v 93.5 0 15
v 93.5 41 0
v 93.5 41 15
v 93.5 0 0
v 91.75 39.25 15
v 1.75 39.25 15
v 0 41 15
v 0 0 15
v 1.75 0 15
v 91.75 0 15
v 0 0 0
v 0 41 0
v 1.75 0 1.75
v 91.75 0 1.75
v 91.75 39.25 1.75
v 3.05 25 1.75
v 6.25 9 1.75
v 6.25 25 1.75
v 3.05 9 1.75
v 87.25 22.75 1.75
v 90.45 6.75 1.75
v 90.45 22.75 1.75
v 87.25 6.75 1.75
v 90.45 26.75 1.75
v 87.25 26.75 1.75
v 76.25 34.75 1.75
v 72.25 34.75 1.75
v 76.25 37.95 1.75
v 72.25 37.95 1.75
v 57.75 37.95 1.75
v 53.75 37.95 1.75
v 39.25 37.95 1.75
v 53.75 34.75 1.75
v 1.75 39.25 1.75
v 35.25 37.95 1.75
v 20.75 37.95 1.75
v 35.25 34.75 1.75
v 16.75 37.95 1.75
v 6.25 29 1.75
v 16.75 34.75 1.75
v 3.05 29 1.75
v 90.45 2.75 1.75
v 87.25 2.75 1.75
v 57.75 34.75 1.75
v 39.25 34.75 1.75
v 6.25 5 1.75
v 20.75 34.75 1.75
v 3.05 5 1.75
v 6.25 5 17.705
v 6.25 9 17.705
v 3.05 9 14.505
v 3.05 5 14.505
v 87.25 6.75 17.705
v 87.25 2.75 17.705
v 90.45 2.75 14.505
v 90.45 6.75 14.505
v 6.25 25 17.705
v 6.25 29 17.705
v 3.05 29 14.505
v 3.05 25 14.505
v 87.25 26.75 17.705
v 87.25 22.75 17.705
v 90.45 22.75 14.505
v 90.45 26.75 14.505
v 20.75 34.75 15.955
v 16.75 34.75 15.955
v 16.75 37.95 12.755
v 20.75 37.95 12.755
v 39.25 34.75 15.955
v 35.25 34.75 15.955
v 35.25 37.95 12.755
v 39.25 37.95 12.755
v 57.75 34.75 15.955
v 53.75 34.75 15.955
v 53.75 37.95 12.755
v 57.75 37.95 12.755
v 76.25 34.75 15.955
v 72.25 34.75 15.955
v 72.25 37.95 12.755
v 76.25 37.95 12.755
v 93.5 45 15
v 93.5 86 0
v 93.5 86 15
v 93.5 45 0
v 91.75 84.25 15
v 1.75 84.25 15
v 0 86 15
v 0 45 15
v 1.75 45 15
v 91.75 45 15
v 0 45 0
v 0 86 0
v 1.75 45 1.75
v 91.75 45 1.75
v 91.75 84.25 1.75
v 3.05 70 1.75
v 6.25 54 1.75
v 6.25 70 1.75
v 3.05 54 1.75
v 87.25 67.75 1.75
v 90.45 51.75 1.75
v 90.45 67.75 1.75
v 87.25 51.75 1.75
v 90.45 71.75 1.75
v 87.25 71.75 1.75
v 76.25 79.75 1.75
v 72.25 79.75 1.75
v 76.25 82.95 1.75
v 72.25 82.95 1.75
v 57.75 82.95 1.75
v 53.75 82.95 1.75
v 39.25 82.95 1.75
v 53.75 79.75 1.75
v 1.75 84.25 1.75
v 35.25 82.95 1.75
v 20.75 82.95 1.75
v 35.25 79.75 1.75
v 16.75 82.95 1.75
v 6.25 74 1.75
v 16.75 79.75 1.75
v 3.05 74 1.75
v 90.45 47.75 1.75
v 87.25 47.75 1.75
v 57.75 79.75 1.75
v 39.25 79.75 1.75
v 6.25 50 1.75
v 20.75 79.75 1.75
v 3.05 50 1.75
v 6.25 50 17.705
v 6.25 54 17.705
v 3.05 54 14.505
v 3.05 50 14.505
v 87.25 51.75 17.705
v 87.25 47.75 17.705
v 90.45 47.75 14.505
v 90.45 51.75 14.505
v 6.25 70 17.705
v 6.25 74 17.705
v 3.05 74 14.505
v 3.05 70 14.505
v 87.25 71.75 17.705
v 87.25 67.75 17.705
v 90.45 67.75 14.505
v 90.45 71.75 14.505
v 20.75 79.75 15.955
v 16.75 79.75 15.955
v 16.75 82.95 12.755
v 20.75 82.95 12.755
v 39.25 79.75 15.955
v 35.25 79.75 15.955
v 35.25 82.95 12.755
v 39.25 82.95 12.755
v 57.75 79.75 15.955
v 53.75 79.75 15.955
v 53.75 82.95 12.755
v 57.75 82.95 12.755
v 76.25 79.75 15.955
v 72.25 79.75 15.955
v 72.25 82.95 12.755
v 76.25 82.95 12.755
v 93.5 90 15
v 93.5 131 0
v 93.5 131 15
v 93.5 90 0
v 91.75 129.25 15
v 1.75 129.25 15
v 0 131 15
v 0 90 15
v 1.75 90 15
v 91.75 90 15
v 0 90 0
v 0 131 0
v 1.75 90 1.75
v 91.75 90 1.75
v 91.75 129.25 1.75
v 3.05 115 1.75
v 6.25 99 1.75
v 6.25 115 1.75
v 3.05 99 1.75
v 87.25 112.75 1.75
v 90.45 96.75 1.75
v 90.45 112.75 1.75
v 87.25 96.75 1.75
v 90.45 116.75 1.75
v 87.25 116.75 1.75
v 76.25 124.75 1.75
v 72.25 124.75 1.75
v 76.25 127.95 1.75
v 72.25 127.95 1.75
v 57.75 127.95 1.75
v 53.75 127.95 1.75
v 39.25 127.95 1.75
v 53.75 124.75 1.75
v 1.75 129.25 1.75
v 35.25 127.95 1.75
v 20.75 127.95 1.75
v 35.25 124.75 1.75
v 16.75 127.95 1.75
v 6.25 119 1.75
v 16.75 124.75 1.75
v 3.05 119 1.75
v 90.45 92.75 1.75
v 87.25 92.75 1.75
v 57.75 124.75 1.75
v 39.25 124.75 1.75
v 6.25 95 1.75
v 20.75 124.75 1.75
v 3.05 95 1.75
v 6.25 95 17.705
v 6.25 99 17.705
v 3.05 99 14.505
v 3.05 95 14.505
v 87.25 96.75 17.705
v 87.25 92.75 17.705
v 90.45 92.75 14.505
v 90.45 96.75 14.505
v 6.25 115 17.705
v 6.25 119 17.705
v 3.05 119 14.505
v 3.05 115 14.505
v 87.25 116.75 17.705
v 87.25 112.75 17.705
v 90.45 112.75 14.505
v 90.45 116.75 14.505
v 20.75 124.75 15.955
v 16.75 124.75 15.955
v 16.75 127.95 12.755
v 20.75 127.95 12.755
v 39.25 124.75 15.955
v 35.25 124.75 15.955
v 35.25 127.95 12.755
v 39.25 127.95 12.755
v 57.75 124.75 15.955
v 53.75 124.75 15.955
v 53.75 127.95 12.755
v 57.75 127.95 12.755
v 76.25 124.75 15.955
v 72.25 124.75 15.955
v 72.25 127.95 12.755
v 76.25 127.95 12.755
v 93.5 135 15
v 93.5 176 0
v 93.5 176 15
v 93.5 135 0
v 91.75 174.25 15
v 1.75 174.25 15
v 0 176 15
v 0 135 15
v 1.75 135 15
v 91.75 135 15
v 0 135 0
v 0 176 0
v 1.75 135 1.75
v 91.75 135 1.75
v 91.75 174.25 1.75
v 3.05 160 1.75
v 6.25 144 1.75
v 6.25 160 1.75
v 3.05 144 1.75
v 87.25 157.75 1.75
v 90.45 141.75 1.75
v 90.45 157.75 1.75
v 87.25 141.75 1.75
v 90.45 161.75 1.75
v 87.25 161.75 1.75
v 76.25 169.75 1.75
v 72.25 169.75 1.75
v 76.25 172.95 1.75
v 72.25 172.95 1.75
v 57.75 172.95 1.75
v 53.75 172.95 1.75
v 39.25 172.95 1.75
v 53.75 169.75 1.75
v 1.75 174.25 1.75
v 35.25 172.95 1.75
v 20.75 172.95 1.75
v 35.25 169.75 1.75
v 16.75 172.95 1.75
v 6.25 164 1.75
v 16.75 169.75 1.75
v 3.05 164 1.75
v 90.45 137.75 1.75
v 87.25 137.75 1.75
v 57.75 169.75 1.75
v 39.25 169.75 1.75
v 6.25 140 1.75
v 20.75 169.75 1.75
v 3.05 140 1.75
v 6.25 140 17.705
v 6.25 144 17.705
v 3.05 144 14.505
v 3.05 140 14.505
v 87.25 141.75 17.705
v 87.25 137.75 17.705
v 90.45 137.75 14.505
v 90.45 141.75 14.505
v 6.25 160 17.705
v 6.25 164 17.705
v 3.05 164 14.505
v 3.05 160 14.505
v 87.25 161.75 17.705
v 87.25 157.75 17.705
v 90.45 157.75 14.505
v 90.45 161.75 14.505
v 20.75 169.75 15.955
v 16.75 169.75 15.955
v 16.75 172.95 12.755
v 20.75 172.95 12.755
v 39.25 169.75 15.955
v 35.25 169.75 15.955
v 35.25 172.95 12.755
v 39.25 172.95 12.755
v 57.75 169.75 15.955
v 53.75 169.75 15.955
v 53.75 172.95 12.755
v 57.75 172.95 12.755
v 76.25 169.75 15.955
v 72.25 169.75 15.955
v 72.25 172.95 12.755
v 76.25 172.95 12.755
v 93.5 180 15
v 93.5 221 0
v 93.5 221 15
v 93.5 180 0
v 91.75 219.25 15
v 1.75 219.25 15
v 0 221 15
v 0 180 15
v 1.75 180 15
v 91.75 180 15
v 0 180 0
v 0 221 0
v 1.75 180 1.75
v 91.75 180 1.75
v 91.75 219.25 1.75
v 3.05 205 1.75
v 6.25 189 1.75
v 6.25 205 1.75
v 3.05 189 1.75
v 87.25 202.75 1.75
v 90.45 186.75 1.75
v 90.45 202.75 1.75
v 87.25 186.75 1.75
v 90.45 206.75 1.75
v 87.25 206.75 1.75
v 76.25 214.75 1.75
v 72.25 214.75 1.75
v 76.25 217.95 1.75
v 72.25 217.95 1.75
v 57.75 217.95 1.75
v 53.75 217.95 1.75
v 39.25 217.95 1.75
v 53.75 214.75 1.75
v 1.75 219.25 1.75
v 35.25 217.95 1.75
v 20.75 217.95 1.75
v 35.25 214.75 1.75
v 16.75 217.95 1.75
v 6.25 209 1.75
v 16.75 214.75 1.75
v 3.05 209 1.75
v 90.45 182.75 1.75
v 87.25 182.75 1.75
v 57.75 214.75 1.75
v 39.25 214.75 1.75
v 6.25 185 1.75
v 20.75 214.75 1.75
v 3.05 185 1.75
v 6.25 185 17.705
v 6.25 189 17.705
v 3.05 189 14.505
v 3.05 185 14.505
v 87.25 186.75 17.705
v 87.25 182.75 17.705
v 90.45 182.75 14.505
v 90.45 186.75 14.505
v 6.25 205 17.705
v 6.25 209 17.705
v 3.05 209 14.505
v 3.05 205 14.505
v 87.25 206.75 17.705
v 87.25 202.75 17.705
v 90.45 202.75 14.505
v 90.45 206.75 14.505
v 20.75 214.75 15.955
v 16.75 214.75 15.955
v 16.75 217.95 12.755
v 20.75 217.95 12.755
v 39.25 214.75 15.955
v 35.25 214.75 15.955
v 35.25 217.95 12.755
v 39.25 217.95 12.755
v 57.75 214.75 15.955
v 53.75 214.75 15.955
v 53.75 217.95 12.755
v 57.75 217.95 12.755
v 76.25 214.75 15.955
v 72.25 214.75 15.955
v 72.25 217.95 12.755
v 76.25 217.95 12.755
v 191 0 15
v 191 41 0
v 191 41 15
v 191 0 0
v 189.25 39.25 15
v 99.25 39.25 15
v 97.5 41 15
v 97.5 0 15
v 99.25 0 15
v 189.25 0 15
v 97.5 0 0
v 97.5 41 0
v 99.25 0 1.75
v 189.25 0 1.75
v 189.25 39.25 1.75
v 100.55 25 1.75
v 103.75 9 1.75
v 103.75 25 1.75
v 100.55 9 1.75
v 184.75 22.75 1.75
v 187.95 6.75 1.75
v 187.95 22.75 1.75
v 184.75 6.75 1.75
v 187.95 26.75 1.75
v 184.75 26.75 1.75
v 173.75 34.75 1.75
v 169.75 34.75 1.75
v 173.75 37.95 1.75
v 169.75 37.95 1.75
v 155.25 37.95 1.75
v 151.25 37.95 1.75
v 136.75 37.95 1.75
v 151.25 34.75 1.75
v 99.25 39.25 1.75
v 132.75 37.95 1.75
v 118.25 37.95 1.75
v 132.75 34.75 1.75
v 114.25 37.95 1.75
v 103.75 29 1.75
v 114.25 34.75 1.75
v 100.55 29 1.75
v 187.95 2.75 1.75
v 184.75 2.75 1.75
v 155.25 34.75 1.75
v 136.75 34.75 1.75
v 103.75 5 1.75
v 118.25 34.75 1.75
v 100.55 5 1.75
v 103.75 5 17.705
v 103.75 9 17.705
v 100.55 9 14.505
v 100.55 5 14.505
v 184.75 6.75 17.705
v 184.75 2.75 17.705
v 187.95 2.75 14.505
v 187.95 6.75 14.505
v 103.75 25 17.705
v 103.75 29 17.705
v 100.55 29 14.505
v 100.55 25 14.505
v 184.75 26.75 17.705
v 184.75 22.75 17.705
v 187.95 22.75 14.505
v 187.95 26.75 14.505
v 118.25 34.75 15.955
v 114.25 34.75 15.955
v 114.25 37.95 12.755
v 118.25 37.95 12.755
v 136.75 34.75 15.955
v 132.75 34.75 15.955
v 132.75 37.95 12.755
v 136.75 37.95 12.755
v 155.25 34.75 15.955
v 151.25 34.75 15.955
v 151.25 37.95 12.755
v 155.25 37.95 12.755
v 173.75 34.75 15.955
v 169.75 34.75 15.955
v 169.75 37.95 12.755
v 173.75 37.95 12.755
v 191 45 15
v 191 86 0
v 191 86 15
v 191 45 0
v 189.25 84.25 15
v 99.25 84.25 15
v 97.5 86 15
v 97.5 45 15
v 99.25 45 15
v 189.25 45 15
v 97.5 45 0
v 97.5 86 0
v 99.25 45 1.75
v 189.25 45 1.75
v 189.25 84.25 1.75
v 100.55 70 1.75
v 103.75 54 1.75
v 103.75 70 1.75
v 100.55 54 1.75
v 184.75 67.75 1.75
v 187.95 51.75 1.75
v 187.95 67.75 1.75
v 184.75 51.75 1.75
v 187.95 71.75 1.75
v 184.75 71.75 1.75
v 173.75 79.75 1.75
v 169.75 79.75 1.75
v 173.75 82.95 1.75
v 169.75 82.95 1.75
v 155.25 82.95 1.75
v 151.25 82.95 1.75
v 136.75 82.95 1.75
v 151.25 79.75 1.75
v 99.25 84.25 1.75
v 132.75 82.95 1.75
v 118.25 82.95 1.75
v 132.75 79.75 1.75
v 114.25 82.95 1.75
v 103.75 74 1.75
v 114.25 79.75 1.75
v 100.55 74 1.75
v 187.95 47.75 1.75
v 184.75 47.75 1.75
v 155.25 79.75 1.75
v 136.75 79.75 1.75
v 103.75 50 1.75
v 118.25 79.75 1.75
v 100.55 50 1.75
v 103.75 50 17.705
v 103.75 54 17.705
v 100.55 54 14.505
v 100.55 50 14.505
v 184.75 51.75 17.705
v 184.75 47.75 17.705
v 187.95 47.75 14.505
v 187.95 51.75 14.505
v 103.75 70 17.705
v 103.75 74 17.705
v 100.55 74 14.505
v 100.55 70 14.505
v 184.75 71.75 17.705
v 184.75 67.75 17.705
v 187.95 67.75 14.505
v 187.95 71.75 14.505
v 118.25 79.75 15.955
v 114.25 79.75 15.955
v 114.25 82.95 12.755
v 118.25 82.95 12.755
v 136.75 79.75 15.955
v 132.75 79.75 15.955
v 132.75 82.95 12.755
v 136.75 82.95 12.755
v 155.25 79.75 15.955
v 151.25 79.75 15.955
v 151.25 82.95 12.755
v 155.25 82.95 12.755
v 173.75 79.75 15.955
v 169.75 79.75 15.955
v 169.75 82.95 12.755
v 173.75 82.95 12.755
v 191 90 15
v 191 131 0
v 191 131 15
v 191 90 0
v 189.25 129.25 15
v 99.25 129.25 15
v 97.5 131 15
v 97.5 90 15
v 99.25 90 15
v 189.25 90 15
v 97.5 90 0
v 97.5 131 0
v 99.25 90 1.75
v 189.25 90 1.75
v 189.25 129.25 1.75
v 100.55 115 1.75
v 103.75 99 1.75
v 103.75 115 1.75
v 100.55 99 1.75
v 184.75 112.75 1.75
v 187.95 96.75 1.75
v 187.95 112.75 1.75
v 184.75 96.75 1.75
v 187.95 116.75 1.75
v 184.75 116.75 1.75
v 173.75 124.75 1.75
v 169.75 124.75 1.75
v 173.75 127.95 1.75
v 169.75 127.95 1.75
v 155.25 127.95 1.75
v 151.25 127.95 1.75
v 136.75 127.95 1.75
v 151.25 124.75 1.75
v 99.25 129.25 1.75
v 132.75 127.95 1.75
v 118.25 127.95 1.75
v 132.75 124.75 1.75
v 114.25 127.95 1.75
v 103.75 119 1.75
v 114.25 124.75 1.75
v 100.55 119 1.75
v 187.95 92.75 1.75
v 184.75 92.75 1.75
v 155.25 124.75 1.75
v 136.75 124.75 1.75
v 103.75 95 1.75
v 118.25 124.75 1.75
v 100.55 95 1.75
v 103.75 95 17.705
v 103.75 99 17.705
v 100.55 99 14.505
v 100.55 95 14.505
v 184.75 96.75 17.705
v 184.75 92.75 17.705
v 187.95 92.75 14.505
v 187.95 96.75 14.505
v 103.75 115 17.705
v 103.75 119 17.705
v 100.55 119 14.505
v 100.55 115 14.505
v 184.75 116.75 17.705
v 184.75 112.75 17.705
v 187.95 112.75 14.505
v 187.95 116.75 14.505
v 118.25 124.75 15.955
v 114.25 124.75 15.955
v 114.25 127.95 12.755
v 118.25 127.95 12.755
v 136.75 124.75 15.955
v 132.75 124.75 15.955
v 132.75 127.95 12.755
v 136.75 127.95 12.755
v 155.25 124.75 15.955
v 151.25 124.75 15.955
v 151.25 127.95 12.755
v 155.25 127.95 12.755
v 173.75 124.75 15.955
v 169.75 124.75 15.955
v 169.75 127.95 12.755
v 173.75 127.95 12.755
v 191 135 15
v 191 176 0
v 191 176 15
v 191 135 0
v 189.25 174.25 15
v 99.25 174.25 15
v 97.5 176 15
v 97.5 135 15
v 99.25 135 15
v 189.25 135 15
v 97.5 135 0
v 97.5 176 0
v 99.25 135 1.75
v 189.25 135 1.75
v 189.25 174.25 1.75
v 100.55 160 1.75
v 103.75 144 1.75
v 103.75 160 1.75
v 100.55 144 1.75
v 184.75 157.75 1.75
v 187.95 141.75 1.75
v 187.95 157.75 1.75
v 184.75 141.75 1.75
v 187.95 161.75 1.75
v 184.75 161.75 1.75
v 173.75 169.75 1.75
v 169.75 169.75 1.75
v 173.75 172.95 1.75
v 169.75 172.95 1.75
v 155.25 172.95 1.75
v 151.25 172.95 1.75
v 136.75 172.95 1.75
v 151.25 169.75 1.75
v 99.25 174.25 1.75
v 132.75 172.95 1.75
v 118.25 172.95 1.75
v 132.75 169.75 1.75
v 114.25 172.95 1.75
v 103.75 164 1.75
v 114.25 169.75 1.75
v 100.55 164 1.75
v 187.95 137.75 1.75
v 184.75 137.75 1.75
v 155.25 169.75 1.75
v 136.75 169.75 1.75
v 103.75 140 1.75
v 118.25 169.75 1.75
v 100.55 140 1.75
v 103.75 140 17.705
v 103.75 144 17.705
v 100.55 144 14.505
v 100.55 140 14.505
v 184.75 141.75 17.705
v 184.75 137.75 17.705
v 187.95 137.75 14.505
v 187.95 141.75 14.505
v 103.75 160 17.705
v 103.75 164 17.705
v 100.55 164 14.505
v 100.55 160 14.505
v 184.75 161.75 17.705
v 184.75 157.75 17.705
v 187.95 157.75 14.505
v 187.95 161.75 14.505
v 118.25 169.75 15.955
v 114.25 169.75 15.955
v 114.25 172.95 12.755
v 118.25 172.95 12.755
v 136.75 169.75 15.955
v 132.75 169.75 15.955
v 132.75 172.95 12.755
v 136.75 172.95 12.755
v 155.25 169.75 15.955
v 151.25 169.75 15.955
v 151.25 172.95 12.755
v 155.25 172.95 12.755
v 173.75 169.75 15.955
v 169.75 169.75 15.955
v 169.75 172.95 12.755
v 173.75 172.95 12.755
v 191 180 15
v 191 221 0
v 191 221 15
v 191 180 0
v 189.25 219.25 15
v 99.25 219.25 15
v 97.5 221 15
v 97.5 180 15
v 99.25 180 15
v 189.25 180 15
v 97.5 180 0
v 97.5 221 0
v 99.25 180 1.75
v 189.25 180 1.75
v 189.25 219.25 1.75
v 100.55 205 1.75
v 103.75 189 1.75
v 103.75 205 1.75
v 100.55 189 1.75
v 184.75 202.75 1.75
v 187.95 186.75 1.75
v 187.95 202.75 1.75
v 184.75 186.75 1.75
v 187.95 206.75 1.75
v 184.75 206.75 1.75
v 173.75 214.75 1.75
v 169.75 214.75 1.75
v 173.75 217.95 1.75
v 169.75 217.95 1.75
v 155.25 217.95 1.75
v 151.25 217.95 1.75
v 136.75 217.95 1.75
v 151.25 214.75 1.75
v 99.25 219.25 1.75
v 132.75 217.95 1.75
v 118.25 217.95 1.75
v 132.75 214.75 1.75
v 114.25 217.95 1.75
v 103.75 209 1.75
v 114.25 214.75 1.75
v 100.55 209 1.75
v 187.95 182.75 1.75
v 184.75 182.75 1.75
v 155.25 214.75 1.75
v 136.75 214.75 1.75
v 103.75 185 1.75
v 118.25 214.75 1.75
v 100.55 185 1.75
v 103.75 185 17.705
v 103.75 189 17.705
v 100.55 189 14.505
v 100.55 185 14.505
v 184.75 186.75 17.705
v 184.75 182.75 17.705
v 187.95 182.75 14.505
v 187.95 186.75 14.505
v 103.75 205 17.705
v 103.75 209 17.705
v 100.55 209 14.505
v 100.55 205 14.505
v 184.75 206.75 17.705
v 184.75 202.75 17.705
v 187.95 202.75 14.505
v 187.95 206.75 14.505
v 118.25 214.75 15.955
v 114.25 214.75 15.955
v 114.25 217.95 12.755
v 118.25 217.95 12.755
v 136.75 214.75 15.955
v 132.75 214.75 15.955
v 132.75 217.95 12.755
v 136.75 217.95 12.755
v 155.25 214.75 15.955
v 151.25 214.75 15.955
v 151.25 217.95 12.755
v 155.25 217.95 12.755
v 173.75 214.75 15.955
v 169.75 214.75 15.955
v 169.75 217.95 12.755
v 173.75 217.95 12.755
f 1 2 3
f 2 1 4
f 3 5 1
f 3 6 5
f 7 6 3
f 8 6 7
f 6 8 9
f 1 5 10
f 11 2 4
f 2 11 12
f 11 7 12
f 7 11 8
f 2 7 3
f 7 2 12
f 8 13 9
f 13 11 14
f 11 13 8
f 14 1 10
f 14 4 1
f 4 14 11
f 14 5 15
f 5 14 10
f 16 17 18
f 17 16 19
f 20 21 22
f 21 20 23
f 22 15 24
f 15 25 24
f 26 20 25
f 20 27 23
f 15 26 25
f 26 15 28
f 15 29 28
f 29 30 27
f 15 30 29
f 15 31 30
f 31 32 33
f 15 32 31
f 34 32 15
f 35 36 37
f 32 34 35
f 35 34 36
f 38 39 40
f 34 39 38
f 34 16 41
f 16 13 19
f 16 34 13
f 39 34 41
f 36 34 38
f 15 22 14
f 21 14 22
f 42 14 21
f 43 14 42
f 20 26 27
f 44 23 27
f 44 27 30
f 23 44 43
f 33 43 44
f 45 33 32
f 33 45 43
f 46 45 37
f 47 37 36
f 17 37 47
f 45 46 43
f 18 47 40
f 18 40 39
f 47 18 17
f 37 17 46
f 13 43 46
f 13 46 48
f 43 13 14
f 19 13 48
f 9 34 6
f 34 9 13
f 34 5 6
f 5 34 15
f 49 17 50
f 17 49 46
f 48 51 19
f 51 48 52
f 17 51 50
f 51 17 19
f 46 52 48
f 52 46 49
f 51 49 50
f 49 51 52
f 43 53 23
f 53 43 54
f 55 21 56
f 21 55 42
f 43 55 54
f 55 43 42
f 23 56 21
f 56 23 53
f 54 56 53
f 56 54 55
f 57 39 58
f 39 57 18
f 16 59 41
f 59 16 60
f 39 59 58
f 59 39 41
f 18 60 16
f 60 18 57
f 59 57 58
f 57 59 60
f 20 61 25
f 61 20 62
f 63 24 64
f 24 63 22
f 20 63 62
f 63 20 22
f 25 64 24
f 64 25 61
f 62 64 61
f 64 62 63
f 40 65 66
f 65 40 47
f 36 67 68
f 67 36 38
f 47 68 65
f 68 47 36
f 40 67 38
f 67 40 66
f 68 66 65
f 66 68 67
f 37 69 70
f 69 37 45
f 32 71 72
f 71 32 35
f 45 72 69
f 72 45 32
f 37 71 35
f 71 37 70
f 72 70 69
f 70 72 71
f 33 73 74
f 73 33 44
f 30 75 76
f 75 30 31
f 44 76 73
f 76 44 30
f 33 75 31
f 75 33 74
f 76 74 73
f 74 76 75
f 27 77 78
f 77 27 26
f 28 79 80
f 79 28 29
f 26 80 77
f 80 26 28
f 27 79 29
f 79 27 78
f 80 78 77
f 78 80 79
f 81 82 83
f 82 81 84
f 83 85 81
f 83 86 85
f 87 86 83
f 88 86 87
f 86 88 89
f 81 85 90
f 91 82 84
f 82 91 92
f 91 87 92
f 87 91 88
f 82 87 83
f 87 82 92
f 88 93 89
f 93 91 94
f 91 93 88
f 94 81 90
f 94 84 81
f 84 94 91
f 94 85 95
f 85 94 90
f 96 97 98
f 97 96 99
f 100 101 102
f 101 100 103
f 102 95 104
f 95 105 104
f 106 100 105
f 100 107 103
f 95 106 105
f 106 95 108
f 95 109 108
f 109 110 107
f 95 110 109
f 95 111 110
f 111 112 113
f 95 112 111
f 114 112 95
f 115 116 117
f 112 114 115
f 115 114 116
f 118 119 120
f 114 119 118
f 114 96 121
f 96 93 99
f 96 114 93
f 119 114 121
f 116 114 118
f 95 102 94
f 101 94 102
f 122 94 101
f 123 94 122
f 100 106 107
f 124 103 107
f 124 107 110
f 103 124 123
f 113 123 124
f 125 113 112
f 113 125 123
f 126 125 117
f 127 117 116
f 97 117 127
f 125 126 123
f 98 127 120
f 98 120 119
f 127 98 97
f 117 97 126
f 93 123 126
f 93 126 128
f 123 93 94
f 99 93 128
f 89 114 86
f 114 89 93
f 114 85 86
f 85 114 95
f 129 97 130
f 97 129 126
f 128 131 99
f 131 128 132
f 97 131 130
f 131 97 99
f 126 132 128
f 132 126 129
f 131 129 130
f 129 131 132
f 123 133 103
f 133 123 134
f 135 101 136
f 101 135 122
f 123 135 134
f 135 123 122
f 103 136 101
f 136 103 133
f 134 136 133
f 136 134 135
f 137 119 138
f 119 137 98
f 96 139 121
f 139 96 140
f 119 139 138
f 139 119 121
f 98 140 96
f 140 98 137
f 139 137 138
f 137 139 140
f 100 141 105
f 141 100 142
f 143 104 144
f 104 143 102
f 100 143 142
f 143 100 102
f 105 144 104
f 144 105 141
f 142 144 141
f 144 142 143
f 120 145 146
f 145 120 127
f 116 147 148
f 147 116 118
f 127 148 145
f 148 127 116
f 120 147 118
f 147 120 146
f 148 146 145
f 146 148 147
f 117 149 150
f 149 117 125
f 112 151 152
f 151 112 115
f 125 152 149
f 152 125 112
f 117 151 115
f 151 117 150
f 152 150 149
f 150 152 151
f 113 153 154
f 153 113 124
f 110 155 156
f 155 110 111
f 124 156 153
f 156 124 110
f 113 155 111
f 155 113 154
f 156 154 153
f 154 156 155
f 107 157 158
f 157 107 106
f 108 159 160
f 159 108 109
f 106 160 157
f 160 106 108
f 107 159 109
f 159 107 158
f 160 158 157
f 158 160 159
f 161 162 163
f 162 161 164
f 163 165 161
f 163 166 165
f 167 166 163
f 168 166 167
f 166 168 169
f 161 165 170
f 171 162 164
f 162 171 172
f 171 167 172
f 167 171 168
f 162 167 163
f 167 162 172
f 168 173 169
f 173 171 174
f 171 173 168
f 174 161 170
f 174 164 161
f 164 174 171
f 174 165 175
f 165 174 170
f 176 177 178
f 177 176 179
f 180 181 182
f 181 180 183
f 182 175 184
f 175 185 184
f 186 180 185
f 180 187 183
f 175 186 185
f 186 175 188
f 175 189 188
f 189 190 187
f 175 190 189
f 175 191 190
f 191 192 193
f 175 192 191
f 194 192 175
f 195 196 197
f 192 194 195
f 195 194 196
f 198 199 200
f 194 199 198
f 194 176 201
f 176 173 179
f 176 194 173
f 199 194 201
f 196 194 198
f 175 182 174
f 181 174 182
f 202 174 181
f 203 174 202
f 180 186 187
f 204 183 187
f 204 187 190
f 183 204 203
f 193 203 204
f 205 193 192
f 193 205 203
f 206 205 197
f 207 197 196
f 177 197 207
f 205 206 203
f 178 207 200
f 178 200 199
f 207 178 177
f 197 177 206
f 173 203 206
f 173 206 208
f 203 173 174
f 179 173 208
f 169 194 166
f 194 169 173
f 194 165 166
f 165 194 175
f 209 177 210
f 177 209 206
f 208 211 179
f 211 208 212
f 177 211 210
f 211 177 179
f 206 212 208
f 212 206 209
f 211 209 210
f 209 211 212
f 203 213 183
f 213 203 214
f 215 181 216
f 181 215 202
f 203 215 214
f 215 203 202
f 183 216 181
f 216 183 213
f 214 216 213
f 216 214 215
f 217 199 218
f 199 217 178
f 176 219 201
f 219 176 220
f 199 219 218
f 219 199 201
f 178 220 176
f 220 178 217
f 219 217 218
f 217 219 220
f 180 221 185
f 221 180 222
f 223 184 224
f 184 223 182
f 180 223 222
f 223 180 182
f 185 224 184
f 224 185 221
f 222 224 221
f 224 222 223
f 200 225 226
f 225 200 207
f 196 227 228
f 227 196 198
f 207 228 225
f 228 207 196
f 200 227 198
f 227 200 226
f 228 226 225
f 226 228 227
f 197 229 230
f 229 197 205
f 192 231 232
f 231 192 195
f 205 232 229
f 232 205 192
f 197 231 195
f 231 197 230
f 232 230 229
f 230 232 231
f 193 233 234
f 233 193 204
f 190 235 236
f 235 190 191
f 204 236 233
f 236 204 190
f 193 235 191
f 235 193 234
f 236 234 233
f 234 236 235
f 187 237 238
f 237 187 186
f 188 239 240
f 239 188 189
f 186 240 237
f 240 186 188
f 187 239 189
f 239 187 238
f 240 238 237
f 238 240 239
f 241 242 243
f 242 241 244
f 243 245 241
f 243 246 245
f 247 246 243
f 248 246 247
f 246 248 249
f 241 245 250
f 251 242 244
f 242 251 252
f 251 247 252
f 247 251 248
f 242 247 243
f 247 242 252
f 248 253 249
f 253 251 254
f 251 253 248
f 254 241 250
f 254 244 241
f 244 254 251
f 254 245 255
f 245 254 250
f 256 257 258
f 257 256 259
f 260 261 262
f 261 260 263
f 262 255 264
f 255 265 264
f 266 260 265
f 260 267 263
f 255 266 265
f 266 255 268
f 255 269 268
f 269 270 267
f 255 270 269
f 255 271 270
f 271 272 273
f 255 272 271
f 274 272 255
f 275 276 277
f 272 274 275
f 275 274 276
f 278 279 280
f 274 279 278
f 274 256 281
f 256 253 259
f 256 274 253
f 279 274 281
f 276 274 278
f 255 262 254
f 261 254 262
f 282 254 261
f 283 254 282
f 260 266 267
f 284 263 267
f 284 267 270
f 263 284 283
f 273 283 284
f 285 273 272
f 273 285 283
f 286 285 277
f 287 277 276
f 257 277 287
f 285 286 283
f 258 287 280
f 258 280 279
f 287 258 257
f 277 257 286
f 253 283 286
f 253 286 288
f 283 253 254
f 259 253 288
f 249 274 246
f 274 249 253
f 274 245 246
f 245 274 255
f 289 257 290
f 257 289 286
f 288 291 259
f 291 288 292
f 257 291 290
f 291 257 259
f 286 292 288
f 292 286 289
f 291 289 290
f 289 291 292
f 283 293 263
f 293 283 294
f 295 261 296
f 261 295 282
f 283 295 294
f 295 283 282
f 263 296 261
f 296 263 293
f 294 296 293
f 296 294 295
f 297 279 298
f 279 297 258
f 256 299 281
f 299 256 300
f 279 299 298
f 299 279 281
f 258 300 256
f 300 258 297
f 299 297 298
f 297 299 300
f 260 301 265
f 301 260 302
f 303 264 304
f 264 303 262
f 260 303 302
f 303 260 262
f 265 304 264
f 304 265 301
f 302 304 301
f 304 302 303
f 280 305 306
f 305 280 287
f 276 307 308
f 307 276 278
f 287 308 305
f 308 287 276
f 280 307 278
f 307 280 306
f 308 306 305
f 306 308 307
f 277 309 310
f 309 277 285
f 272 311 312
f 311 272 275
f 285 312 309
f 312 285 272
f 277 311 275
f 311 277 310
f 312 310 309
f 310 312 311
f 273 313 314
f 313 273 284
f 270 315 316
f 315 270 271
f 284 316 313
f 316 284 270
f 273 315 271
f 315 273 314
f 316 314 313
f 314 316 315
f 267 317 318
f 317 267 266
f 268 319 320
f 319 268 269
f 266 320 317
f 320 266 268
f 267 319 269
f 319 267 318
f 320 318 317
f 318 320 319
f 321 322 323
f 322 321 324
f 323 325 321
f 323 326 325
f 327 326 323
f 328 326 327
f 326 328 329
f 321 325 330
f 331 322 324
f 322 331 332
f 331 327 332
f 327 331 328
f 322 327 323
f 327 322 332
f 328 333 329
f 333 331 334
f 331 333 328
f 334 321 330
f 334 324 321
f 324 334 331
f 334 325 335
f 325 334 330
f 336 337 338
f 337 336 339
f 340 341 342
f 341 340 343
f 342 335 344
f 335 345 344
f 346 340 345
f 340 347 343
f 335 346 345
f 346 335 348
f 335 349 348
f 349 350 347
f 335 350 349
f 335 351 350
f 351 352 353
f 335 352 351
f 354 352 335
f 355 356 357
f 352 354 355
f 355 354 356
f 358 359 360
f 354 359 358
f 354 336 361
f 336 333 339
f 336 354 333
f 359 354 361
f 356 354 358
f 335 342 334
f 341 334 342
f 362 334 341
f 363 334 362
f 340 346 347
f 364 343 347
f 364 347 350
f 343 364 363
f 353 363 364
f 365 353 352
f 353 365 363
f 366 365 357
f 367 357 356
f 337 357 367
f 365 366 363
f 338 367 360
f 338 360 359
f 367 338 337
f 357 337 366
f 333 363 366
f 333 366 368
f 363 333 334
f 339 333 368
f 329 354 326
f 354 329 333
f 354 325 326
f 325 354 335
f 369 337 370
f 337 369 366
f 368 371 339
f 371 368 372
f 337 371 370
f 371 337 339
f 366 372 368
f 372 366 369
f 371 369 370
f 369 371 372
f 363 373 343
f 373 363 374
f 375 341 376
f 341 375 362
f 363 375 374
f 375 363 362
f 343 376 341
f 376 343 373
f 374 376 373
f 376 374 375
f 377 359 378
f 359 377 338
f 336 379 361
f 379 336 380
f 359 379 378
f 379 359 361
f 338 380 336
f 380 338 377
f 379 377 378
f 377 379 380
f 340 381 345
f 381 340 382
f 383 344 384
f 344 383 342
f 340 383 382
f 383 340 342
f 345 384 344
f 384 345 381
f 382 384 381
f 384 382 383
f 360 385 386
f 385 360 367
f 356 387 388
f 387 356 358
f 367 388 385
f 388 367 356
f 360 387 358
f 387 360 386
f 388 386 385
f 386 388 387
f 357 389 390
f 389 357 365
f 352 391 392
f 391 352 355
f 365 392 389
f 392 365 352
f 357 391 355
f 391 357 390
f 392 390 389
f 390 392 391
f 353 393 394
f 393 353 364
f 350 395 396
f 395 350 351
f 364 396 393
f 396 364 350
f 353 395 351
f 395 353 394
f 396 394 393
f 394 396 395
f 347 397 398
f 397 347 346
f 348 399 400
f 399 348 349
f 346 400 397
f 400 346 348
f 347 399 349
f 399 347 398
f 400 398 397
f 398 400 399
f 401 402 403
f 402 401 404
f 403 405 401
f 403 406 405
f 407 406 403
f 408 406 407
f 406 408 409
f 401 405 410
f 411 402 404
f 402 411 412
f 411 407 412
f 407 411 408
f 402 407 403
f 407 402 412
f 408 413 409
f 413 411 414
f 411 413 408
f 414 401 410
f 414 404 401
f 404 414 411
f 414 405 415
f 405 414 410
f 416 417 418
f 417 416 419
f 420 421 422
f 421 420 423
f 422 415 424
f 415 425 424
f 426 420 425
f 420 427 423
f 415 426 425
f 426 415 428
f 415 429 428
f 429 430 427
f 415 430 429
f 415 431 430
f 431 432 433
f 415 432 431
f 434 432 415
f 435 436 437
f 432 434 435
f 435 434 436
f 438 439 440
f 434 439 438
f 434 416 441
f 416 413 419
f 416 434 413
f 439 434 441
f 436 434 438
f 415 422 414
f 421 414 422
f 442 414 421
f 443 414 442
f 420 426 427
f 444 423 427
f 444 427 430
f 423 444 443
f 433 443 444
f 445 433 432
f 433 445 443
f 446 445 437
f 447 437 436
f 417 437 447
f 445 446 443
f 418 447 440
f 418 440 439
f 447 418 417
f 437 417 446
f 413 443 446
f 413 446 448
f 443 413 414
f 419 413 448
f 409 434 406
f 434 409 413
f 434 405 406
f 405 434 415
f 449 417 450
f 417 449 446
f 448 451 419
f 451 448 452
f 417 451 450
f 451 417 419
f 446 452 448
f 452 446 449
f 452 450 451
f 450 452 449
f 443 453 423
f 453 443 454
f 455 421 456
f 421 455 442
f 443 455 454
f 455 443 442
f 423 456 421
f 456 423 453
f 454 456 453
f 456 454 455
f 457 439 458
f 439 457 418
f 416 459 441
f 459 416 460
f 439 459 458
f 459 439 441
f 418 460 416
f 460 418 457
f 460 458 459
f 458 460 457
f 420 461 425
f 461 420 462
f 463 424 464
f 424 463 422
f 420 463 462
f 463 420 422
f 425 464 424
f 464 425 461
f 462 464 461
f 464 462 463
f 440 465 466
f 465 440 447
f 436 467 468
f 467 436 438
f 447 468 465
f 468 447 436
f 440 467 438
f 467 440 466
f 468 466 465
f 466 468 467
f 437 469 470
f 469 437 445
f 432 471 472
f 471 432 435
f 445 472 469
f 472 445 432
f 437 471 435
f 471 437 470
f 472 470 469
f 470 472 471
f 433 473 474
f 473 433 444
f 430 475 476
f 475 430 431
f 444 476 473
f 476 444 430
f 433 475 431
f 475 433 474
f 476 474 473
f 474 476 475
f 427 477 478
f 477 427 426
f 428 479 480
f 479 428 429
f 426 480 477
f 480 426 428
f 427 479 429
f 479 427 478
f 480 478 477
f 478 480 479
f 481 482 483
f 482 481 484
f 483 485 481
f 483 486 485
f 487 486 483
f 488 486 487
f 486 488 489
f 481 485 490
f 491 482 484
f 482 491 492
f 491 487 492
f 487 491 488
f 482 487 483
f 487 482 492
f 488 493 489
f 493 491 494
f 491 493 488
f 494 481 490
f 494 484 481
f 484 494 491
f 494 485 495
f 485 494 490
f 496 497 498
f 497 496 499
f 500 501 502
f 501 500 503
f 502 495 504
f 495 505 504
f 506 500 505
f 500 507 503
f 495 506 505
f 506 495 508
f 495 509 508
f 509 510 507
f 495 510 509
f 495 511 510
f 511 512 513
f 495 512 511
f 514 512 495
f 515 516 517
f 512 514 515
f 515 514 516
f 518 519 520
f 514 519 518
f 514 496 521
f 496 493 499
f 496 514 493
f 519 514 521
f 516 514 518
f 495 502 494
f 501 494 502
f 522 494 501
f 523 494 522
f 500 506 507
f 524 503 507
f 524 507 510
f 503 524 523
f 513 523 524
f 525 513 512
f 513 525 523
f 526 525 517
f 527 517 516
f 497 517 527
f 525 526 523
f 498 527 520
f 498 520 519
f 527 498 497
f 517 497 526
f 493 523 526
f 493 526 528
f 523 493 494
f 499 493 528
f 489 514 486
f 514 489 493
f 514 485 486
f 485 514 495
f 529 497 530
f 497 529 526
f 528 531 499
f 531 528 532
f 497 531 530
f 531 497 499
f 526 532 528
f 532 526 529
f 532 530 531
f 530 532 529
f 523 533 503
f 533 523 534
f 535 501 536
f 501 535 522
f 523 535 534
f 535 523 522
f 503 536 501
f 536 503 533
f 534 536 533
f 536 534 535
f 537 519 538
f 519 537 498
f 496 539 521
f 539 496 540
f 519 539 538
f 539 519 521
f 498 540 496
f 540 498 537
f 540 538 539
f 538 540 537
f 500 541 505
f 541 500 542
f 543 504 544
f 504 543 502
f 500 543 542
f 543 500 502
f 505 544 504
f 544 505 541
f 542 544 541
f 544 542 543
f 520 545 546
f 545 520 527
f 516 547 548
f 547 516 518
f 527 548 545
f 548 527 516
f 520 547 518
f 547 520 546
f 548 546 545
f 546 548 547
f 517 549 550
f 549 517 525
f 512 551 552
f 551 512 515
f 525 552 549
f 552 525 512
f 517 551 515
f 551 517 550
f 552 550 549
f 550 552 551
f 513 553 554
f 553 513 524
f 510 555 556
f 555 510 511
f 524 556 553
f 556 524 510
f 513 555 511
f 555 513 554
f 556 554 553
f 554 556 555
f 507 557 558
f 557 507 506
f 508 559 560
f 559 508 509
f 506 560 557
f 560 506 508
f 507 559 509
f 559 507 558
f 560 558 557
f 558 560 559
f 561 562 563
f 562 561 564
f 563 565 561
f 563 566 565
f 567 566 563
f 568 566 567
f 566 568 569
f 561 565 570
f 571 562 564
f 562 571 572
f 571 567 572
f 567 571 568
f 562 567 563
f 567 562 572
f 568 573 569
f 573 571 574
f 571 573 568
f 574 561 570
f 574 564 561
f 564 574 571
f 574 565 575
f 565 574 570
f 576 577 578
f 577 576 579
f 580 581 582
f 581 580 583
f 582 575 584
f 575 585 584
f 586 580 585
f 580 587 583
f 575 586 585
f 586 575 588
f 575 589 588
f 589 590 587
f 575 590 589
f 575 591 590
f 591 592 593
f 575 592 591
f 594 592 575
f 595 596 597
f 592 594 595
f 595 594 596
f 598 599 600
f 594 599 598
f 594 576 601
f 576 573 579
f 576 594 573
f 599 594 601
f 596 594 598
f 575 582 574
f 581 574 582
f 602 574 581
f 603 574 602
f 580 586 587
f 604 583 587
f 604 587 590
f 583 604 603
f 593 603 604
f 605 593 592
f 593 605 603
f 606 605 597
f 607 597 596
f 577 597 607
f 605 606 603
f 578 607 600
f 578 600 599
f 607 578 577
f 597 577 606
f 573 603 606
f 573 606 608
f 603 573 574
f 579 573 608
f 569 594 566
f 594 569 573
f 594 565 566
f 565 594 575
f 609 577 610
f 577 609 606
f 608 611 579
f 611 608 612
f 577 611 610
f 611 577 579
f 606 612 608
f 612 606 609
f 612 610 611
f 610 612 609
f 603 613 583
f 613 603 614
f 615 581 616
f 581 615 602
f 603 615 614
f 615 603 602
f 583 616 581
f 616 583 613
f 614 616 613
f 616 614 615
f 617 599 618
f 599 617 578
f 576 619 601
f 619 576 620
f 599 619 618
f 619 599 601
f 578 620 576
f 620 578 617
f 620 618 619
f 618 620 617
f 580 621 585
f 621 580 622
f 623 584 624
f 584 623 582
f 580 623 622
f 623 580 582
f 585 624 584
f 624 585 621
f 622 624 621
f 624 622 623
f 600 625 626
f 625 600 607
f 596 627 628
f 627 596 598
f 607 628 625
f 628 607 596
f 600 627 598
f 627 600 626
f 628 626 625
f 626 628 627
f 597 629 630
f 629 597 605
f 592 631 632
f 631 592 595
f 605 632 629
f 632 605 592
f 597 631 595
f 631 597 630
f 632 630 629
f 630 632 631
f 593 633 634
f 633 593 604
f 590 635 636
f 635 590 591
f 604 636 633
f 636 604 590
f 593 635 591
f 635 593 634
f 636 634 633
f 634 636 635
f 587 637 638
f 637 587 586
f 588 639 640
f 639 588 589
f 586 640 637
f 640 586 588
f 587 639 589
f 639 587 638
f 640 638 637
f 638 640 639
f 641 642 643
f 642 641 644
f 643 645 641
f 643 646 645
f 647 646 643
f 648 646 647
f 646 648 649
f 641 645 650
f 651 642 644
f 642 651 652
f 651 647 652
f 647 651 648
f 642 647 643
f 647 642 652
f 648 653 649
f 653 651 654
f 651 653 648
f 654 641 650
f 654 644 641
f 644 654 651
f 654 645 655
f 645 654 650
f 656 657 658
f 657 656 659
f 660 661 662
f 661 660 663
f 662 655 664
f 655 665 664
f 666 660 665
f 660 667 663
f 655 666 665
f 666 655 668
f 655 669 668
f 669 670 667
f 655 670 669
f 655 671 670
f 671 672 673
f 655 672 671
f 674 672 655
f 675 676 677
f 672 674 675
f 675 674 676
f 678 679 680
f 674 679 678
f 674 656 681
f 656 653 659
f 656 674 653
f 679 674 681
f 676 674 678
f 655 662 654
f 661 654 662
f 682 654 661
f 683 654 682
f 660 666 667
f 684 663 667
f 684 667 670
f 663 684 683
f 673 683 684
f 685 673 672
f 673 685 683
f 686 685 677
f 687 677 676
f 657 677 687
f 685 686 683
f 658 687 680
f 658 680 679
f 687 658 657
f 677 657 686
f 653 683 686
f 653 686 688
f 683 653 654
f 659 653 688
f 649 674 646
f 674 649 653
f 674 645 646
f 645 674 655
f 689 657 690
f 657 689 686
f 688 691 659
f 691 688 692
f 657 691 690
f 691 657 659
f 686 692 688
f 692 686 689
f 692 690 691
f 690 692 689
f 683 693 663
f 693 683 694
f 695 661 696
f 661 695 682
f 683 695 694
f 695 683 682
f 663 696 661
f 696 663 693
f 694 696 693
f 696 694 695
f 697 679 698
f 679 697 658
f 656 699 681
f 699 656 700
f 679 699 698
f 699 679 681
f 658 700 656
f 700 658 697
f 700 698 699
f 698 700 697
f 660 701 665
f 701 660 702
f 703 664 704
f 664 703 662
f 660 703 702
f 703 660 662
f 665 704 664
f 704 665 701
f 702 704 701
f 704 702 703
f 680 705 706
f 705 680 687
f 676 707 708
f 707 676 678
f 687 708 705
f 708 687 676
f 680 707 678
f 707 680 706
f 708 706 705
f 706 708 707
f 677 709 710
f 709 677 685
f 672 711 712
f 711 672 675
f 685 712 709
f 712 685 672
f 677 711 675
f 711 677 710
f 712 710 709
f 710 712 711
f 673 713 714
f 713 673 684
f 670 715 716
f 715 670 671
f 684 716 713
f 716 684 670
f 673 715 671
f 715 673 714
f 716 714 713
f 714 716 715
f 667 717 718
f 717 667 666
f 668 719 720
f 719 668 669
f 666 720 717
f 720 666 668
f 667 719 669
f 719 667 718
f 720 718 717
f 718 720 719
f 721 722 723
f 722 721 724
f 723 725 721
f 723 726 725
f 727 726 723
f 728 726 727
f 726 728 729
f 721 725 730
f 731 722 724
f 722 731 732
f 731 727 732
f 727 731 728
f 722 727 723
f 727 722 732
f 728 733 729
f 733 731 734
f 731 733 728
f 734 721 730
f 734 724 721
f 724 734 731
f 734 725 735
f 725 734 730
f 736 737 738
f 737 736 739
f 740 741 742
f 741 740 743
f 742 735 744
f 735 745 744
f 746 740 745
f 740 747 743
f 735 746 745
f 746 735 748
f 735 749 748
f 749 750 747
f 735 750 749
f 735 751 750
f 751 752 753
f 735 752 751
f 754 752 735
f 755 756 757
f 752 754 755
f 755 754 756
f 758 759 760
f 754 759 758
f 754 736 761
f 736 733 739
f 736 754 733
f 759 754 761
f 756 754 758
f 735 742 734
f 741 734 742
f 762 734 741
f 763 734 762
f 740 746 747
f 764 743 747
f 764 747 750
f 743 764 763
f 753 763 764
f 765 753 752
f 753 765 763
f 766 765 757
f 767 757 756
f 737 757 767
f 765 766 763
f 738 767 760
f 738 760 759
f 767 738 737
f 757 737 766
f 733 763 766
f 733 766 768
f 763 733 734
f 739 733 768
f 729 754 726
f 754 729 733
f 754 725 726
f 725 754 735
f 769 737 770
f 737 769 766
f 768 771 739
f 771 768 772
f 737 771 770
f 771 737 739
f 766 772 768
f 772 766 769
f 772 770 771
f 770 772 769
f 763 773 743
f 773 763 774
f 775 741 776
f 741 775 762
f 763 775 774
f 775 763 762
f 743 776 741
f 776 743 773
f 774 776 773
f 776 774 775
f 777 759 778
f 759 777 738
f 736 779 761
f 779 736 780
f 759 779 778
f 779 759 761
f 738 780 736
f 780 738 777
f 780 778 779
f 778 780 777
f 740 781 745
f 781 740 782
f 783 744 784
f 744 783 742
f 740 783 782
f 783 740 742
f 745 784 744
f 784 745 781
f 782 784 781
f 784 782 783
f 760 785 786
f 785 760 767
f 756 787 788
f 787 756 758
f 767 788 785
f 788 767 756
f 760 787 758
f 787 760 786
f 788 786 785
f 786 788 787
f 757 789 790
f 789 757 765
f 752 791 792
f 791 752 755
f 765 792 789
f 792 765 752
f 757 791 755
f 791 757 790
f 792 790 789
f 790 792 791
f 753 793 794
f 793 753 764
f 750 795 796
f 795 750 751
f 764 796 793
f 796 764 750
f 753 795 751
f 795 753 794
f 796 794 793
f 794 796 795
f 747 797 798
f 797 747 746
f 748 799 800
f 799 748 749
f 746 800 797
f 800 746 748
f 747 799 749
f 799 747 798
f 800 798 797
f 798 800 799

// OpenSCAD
wall = 1.75;
spacing = 1.3;
l = 3.2;
size = [90+2*wall, 41, 15];

module tooth_()
{
  size = 4;
  difference()
  {
    cube([l, size, 16]);
    translate([0, 0, 16+l/2.5])
      rotate([0, 45, 0])
        translate([0, 0, -l])
          cube([l, size, 2*l]);
  }
}

module element()
{
  // body
  difference()
  {
    cube(size);
    translate(wall*[1, 0, 1])
      cube(size - wall*[2, 1, 1]);
  }

  // side teeth
  for(dy=[5, 25])
    translate([wall+spacing, dy, wall])
    {
      tooth_();
      translate([size[0]-2*(wall+spacing), wall, 0])
        rotate([0, 0, 180])
          tooth_();
    }

  // upper teeth
  for(dx=[0:3])
    translate([wall + 15 + dx*18.5, size[1]-wall-spacing-l, 0])
      translate([0, l, 0])
        rotate([0, 0, -90])
          tooth_();
}

distance = 4;
for(n=[0:1])
  for(m=[0:4])
    translate([n*(size[0]+distance), m*(size[1]+distance), 0])
      element();
